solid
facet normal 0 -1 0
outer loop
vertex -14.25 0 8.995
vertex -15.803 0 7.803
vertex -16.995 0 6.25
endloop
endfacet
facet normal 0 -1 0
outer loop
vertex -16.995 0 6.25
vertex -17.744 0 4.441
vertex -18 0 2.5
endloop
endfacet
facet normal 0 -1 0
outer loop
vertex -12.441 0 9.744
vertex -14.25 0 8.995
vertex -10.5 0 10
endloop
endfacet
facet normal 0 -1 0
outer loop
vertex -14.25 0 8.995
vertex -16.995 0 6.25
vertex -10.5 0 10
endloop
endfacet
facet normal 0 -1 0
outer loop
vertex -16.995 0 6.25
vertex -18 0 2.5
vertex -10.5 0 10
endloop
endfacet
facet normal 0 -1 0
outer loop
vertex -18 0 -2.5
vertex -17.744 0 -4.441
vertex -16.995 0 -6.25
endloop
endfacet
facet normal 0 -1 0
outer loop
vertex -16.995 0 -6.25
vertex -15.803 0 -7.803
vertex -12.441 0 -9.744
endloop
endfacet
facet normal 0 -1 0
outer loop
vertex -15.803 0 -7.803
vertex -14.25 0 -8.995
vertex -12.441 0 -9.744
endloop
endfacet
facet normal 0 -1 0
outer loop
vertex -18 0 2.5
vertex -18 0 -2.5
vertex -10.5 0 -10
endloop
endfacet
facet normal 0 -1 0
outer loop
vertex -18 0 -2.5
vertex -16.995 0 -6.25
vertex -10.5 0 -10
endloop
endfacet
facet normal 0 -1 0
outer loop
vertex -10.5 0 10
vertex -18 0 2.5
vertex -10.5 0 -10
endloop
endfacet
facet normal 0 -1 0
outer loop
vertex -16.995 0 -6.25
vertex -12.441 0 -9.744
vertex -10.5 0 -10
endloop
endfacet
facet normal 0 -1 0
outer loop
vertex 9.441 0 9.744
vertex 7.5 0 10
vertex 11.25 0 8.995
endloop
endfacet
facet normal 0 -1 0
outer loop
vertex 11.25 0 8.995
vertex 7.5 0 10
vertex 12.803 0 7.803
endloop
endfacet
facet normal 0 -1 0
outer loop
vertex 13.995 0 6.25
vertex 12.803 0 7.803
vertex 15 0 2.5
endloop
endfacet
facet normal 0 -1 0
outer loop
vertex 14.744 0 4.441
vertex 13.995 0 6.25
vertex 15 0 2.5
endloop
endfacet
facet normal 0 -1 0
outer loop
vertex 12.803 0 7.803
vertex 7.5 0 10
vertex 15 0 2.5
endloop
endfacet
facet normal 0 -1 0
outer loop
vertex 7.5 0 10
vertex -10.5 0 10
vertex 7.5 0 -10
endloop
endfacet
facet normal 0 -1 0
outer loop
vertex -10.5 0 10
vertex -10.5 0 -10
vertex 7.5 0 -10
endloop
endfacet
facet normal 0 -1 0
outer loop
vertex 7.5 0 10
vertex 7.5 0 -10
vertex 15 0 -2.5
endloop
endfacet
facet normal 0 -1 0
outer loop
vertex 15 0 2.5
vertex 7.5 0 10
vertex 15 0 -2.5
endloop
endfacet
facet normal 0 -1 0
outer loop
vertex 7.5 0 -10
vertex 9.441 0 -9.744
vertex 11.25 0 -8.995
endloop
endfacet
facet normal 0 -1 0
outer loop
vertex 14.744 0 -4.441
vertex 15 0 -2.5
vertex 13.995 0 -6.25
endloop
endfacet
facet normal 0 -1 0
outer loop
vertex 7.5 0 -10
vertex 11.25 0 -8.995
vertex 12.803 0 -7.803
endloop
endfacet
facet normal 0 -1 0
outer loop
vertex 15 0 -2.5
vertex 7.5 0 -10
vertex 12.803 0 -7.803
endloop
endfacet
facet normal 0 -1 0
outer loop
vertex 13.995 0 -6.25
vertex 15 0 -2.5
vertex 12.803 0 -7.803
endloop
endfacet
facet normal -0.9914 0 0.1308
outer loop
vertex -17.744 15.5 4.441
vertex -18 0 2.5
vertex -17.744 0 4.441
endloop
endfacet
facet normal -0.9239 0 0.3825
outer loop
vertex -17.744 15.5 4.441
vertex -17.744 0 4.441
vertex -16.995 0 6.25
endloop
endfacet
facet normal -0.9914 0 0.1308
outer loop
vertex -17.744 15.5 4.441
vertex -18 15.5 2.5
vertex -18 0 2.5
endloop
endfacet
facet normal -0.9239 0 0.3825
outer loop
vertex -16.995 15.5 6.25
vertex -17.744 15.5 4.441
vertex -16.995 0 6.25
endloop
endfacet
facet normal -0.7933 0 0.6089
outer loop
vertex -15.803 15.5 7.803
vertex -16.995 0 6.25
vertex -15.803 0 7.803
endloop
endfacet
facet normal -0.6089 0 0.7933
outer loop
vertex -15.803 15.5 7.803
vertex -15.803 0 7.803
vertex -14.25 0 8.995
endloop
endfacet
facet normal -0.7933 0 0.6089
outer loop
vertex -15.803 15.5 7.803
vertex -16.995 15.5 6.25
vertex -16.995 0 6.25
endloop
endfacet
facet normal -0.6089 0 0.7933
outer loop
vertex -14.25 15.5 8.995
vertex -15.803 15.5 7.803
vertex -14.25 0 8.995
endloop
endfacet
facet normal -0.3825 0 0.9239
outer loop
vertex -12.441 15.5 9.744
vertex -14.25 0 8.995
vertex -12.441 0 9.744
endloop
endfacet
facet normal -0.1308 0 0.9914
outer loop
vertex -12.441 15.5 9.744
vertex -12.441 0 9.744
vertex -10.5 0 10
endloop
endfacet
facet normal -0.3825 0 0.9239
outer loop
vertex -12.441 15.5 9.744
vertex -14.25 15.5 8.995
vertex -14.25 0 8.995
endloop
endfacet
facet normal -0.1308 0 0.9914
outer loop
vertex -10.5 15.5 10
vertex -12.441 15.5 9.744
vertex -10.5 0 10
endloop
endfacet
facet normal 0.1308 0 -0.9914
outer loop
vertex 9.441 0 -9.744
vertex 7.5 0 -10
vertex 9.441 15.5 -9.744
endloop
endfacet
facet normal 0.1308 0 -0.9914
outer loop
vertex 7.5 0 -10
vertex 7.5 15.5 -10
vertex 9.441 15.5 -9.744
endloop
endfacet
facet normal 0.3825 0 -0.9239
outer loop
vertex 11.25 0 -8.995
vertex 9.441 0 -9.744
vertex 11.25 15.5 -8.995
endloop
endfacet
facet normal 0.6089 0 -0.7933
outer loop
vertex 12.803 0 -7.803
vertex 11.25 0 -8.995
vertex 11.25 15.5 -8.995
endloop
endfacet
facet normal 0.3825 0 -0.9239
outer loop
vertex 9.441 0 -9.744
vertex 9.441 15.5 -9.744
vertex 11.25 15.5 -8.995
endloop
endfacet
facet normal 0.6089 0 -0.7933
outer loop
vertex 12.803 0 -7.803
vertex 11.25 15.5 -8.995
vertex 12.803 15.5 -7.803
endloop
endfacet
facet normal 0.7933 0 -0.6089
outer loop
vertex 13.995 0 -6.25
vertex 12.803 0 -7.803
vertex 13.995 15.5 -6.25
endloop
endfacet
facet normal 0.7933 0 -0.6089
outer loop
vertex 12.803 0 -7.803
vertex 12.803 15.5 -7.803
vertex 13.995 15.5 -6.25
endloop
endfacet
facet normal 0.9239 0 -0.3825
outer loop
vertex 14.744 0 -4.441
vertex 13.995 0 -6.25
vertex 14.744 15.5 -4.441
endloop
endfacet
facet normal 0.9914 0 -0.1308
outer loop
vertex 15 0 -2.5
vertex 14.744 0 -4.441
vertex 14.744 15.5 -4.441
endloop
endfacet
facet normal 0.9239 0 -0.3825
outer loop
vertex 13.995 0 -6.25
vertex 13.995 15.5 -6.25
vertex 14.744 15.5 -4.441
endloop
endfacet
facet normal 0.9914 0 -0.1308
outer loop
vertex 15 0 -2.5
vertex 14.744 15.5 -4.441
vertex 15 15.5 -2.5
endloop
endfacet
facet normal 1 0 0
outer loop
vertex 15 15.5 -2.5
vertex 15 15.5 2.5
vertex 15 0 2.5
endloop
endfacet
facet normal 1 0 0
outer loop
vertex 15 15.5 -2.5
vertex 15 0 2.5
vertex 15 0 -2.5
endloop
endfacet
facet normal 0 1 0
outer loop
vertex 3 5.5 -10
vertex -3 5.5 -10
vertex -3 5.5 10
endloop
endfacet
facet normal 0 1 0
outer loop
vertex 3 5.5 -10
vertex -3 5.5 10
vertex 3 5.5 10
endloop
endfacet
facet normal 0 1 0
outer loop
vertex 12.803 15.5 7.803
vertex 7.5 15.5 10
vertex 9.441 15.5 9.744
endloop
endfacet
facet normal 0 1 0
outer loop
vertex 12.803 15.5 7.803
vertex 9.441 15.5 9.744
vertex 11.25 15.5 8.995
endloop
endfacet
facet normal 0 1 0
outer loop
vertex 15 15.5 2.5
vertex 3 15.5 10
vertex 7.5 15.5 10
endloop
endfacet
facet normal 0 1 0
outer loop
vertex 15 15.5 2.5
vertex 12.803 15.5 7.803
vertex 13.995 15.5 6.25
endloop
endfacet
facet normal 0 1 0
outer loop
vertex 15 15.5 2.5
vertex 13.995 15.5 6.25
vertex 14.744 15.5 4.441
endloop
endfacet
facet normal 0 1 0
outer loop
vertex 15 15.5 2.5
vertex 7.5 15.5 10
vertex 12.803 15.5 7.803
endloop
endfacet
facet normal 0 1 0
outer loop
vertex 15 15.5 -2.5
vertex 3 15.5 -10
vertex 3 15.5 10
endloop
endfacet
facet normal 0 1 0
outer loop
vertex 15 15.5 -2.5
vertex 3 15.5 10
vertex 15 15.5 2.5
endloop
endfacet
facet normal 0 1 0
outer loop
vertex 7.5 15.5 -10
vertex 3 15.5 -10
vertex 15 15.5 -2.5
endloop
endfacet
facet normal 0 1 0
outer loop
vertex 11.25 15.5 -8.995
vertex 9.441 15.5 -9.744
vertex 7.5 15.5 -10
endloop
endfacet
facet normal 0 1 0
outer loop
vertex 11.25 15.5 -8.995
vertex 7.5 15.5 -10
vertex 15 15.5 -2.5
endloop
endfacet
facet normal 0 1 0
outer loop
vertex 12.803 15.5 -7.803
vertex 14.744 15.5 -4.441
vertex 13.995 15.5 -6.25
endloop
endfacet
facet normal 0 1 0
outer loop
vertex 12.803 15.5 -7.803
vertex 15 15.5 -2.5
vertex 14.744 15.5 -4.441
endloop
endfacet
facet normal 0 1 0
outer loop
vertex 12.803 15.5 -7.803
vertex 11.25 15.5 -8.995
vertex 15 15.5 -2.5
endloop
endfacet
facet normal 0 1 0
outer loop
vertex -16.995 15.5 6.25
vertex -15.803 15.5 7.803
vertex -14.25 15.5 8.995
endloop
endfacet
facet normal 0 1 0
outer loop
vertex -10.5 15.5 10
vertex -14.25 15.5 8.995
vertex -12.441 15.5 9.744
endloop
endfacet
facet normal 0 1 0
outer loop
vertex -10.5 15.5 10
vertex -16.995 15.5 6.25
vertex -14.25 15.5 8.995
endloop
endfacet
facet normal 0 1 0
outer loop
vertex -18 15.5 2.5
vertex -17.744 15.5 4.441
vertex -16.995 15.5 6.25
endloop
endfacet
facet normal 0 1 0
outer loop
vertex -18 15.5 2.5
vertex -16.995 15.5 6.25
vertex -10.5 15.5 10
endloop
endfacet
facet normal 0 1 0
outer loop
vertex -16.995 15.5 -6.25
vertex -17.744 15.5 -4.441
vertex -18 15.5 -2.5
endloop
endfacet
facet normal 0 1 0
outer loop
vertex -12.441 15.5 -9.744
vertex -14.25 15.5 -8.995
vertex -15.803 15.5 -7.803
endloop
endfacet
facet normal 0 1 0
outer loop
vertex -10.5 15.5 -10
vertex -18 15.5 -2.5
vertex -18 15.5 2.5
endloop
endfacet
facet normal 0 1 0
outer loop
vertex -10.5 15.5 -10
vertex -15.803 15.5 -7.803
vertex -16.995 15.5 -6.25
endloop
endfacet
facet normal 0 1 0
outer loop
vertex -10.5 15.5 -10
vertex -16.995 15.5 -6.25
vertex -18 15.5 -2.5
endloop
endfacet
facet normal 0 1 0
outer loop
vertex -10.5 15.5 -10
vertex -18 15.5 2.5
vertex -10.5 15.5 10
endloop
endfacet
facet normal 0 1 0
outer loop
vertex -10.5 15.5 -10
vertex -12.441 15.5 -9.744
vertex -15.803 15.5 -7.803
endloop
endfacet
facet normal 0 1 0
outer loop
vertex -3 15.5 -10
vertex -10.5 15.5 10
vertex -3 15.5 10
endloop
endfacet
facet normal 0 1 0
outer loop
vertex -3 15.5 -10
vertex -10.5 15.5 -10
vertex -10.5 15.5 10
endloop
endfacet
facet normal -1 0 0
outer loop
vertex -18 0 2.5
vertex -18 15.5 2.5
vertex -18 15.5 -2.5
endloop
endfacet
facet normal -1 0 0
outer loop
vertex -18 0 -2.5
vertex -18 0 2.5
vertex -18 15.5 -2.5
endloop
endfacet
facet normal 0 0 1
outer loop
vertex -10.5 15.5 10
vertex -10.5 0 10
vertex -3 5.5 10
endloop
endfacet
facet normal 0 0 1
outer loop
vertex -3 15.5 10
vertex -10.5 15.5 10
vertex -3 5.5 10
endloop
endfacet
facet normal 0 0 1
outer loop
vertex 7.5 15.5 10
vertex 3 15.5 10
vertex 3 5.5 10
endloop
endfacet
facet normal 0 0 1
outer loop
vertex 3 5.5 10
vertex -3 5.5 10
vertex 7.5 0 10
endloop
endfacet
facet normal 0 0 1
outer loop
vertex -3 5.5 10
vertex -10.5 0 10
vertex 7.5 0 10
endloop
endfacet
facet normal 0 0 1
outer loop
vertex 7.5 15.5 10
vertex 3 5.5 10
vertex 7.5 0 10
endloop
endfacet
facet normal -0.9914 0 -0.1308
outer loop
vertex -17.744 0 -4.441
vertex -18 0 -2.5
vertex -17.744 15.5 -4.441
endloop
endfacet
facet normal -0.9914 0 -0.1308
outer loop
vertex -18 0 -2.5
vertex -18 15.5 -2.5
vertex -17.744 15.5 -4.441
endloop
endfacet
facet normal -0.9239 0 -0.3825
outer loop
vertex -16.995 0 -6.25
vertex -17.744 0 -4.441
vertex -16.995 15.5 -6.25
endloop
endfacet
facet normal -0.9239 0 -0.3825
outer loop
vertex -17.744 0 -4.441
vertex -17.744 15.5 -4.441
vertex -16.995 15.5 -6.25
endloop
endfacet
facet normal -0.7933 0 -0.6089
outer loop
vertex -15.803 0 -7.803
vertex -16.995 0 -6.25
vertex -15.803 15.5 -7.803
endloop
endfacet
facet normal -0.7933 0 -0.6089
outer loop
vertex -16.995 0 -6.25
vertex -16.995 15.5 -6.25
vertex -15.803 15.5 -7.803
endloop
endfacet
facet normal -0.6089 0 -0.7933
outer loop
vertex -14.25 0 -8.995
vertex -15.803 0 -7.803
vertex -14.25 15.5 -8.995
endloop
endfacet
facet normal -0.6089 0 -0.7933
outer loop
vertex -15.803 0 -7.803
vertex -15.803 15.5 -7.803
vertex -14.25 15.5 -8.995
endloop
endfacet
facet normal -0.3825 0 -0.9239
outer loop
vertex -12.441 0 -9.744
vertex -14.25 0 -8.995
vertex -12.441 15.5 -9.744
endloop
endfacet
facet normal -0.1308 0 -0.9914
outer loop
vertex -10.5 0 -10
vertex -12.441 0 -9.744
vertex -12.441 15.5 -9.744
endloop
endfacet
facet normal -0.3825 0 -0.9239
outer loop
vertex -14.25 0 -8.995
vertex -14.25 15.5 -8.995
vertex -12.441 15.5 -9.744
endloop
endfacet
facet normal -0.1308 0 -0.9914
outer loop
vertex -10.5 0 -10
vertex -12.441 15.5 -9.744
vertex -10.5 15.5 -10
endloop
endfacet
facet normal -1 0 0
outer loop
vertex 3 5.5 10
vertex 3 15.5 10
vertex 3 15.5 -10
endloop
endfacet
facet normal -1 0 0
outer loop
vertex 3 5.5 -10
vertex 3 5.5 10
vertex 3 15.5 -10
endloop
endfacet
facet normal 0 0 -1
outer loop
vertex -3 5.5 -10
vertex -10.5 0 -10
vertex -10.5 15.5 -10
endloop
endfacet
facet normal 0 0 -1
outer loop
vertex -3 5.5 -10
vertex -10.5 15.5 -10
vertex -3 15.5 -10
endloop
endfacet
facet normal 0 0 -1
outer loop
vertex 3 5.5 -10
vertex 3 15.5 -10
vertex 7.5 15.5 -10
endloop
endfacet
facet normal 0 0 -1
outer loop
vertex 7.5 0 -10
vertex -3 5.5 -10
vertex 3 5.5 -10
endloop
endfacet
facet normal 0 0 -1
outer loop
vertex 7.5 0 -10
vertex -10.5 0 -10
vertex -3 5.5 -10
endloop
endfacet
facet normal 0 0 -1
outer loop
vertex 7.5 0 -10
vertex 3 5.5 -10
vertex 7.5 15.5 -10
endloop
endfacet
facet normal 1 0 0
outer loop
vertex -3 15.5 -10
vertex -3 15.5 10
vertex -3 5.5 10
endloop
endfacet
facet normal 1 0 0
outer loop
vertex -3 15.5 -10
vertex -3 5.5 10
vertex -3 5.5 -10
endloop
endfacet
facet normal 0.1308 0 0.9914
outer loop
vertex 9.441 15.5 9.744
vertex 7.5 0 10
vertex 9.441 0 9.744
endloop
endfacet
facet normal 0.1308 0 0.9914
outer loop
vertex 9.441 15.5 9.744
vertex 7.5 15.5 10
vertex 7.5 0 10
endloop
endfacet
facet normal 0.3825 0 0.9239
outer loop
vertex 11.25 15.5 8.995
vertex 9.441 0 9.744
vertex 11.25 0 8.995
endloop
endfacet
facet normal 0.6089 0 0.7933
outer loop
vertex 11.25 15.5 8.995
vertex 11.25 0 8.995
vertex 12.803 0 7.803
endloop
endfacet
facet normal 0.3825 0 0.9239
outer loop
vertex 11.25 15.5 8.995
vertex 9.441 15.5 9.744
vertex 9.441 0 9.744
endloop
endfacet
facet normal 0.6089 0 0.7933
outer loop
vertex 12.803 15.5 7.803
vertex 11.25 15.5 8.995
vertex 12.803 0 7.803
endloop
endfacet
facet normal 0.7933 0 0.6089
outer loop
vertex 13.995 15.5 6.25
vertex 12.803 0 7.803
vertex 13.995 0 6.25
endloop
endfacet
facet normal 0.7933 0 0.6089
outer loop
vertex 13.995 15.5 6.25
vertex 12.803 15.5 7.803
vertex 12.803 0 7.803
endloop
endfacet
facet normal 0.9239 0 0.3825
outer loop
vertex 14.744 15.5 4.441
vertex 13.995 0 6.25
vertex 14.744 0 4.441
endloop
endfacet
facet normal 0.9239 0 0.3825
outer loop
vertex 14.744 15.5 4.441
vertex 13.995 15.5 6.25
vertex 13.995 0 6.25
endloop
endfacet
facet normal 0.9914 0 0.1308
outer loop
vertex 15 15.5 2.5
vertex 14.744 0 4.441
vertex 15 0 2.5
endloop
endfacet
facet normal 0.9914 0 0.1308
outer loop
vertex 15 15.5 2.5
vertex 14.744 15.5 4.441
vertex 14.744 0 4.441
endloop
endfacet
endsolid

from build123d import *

# Parameters (mm, degrees)
CROQUIS1_W              = 33
CROQUIS1_H              = 20
SALIENTE_EXTRUIR1_DEPTH = 15.5
CROQUIS6_W              = 6
CROQUIS6_H              = 20
CORTAR_EXTRUIR2_DEPTH   = 10
REDONDEO1_R             = 7.5


with BuildPart() as part:
    # Croquis1 → Saliente-Extruir1 (new body)
    with BuildSketch(Plane(origin=(0, 0, 0), x_dir=(1, 0, 0), z_dir=(0, 1, 0))):
        with Locations((-1.5, 0)):
            Rectangle(CROQUIS1_W, CROQUIS1_H)
    extrude(amount=SALIENTE_EXTRUIR1_DEPTH)

    # Croquis6 → Cortar-Extruir2 (cut)
    with BuildSketch(Plane(origin=(0, 15.5, 0), x_dir=(1, 0, 0), z_dir=(0, 1, 0))):
        Rectangle(CROQUIS6_W, CROQUIS6_H)
    extrude(amount=-CORTAR_EXTRUIR2_DEPTH, mode=Mode.SUBTRACT)

    # Redondeo1
    redondeo1_edges = [part.edges().sort_by_distance(p)[0] for p in [
        (15, 7.75, 10),
        (-18, 7.75, 10),
        (-18, 7.75, -10),
        (15, 7.75, -10),
    ]]
    fillet(redondeo1_edges, radius=REDONDEO1_R)


solid = part.part
